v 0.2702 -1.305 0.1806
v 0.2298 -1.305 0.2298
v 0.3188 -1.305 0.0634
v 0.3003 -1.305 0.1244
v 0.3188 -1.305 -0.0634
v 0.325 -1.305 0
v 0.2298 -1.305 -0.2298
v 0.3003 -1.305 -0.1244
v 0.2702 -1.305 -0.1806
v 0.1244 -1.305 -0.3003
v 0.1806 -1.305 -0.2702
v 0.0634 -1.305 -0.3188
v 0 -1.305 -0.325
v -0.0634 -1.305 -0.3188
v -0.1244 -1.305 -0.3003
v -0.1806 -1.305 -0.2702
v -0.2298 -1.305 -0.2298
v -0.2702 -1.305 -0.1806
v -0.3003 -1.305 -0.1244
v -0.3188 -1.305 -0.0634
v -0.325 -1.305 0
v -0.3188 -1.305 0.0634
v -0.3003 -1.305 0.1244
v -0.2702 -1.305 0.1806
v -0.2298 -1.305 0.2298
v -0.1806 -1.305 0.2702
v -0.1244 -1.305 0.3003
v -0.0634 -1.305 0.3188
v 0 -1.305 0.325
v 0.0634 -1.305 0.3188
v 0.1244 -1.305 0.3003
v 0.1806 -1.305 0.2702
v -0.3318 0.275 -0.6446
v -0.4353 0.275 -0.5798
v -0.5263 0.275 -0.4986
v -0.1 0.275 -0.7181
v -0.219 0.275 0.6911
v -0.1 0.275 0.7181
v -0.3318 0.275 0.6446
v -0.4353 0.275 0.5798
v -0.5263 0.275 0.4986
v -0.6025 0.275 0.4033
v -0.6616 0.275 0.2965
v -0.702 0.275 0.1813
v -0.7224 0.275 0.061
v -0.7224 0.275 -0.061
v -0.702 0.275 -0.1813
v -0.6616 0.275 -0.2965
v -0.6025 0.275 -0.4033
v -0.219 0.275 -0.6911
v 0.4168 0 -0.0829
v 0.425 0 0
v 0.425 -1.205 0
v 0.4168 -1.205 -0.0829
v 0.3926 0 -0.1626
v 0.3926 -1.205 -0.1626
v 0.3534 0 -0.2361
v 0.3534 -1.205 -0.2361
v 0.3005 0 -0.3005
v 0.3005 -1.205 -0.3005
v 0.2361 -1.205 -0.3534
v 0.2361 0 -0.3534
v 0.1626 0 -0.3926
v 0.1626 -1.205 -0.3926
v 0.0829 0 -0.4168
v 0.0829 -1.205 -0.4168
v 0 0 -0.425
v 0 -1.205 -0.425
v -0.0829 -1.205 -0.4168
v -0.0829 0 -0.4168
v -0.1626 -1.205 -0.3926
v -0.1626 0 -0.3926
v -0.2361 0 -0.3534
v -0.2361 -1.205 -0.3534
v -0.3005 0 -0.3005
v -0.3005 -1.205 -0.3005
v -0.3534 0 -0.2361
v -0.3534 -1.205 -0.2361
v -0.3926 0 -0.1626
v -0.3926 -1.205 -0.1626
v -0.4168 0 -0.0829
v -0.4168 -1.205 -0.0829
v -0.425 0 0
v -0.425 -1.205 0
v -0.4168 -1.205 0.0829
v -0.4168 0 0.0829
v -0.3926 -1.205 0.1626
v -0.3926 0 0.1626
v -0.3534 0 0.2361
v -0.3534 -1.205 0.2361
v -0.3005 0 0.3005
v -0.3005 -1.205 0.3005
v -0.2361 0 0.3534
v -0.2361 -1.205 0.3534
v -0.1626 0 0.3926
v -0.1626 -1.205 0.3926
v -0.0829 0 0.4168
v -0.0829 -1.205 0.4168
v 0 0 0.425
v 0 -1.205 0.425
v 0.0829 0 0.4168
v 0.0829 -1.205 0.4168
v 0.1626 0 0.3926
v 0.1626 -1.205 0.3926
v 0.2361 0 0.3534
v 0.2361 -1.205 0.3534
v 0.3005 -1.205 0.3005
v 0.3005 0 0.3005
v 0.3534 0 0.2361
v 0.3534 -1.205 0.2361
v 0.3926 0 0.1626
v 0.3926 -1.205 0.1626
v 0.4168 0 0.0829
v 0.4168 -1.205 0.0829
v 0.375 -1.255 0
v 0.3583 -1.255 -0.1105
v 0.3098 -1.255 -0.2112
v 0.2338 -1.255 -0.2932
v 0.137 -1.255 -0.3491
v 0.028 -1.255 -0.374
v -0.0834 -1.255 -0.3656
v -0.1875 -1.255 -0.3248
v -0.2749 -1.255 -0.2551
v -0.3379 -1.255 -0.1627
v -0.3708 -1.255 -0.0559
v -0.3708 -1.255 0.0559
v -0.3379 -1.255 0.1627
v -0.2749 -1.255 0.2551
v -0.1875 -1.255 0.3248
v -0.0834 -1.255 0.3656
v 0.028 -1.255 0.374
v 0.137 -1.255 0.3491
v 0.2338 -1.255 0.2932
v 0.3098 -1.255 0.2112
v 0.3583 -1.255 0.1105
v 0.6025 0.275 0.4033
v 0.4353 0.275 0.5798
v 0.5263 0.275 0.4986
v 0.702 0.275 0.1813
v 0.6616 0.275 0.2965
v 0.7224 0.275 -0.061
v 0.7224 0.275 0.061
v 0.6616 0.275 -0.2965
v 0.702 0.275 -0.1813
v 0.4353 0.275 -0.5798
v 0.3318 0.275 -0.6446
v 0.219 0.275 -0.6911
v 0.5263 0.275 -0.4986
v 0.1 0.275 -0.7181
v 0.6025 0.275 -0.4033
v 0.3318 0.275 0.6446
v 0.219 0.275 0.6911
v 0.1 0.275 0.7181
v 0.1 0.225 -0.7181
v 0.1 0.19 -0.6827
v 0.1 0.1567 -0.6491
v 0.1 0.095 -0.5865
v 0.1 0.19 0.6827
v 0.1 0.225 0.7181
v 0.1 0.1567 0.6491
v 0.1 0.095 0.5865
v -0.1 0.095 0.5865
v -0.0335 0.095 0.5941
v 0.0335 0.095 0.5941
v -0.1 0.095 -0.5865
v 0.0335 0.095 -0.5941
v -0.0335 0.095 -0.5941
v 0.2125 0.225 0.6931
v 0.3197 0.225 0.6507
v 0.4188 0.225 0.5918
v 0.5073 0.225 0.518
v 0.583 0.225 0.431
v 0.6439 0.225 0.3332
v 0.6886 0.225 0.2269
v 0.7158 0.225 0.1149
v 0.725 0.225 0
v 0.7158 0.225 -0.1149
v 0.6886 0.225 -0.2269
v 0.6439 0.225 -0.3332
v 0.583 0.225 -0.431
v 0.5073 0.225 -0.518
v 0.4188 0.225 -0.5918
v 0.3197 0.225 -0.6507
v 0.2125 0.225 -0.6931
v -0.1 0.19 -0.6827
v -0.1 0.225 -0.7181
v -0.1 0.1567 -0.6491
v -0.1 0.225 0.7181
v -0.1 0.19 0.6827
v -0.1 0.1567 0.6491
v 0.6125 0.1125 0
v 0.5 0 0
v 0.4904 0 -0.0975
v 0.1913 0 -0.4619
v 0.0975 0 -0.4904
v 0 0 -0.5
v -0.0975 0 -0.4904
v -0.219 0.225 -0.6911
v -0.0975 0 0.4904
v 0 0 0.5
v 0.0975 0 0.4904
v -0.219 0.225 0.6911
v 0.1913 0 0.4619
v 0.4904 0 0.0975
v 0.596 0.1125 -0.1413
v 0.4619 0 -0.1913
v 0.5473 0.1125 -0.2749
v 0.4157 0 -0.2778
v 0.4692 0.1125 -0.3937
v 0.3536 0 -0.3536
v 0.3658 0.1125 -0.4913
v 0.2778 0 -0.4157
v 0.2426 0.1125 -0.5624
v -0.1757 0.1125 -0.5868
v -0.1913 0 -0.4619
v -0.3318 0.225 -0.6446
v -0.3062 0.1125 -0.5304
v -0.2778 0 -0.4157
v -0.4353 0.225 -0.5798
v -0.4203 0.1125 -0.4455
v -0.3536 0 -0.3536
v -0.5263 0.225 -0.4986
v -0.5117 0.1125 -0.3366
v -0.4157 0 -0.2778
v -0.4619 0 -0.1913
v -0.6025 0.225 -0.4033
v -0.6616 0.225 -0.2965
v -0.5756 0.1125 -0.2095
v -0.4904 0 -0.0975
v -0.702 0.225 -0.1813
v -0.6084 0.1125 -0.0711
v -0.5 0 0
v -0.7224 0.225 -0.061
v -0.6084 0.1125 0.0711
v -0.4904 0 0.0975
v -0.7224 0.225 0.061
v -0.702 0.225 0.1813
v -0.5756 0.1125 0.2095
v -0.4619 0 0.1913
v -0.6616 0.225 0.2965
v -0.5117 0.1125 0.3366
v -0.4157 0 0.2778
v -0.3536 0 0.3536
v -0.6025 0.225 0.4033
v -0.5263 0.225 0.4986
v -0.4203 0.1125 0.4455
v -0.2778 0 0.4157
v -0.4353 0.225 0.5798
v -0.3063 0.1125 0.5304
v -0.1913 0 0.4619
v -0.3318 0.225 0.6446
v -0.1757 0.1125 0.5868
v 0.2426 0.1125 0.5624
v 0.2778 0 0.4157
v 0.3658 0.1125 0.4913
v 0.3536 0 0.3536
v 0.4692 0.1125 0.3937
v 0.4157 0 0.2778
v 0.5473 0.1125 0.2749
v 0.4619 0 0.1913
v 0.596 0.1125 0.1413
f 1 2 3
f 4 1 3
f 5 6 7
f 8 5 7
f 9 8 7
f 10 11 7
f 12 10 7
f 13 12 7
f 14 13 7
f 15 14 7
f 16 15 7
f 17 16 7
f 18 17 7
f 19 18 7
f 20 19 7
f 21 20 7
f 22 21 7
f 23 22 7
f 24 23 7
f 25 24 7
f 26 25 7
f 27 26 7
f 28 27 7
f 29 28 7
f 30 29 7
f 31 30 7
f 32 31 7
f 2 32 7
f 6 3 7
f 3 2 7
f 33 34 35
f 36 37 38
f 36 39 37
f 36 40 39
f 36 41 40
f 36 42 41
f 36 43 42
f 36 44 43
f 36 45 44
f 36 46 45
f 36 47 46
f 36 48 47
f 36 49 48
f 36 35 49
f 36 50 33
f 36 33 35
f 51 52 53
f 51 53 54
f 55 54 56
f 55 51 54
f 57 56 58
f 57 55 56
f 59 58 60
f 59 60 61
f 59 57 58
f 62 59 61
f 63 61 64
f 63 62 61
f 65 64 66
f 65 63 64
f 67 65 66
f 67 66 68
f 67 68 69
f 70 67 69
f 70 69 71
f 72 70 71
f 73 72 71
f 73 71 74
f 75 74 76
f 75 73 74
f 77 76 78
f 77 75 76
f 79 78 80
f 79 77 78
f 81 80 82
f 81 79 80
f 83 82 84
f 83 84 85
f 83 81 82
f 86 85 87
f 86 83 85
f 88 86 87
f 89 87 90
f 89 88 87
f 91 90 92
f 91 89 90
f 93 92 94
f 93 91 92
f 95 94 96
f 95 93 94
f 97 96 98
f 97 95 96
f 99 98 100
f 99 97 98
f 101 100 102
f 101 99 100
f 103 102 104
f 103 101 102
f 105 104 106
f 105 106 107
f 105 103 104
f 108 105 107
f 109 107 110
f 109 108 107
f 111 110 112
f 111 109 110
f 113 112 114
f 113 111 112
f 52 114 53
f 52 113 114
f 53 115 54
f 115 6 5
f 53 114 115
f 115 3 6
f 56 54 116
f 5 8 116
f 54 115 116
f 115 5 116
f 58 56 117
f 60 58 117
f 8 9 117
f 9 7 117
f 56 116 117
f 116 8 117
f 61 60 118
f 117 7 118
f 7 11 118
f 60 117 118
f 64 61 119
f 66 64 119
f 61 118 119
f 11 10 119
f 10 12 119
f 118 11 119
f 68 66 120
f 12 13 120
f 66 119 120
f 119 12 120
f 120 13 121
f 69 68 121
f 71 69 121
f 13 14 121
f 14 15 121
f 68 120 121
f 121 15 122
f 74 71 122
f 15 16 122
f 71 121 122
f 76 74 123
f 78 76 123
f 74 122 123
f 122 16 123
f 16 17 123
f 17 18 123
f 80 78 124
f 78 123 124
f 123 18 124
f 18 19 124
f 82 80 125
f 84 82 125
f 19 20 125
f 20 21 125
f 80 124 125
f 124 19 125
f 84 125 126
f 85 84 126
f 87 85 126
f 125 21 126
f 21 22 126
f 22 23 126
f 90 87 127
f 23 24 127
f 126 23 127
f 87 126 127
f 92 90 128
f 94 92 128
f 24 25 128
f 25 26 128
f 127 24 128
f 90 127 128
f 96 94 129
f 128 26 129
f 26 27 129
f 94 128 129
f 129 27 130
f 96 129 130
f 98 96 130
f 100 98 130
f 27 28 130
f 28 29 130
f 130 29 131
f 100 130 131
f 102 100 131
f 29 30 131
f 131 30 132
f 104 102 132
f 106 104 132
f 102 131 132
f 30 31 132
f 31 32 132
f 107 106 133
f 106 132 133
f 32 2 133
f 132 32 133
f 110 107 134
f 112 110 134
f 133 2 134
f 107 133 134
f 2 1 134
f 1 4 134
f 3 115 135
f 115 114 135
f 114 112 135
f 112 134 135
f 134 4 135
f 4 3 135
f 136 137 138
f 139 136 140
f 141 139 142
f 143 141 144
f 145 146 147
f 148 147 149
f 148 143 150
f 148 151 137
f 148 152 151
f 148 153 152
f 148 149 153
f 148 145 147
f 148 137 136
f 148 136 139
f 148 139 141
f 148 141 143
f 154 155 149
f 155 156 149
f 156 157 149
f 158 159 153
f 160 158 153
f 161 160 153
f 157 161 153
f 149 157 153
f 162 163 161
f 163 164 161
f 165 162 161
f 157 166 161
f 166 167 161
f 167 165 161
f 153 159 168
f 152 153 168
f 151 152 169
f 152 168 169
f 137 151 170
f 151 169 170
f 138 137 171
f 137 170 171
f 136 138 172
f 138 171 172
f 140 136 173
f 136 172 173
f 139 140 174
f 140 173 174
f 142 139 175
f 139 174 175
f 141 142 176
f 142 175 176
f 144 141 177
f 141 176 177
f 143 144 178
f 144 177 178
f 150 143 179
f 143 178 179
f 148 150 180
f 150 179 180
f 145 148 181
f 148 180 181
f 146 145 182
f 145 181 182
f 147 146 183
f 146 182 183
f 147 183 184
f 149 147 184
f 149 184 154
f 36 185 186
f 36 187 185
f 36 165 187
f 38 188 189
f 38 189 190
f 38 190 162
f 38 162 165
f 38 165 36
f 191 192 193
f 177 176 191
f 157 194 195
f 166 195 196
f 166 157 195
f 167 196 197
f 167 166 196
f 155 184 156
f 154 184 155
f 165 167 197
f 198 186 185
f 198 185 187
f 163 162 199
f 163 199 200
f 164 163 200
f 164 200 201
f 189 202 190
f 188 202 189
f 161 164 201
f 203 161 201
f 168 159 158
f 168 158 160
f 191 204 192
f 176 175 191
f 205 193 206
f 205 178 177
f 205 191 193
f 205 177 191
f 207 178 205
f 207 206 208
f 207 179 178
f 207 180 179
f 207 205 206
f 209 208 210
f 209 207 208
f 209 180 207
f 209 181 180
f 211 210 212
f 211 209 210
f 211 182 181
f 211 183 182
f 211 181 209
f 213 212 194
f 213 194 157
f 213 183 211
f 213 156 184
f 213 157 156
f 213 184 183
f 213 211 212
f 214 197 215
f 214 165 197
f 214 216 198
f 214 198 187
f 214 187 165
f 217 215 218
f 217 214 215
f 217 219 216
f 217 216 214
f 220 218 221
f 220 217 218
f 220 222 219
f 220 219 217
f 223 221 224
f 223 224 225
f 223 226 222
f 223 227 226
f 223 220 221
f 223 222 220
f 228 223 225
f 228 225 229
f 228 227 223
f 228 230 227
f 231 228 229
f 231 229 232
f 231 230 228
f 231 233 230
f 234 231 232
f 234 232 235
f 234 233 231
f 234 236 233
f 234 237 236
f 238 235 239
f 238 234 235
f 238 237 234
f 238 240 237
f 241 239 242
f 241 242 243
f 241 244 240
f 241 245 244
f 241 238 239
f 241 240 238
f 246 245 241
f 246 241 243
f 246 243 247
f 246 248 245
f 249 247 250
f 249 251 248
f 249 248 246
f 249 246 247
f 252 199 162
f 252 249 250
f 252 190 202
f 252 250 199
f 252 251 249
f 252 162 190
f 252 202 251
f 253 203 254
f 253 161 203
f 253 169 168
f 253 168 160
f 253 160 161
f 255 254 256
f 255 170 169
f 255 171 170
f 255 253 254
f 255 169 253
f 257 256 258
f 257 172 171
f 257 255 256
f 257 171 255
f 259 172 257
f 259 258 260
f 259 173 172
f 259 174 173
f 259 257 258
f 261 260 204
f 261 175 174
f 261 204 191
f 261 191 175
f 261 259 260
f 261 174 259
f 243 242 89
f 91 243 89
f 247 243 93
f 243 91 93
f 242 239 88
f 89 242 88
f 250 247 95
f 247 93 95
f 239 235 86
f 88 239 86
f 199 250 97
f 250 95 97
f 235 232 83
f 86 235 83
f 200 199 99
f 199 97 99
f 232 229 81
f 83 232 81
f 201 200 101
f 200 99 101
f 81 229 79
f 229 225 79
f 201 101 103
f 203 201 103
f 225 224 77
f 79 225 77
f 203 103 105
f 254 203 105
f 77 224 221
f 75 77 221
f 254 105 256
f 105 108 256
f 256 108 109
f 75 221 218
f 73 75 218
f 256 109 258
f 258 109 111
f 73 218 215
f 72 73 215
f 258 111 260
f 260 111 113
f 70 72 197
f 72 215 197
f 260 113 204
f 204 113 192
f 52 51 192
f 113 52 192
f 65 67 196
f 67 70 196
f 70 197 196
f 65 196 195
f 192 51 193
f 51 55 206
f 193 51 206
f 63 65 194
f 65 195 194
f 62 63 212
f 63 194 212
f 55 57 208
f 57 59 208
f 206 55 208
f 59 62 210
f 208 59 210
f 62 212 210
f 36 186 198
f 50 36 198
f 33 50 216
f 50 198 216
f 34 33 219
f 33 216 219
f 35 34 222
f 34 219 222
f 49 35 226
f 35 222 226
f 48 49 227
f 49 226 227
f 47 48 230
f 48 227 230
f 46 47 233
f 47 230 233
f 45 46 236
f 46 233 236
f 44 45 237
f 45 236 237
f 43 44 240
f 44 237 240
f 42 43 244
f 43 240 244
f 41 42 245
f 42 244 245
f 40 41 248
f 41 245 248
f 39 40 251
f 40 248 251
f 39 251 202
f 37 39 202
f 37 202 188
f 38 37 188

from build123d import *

# Parameters (mm, degrees)
SKETCH1_R               = 0.725
BOSS_EXTRUDE1_DEPTH     = 0.275
SKETCH2_R               = 0.425
BOSS_EXTRUDE2_DEPTH     = 1.305
CHAMFER1_SIZE           = 0.1
CHAMFER2_SIZE           = 0.225
SKETCH3_W               = 0.2
SKETCH3_H               = 0.546644051
CUT_EXTRUDE1_DEPTH      = 1.725
CUT_EXTRUDE1_DEPTH_BACK = 1.725


with BuildPart() as part:
    # Sketch1 → Boss-Extrude1 (new body)
    with BuildSketch(Plane(origin=(0, 0, 0), x_dir=(1, 0, 0), z_dir=(0, 1, 0))):
        Circle(SKETCH1_R)
    extrude(amount=BOSS_EXTRUDE1_DEPTH)

    # Sketch2 → Boss-Extrude2 (add)
    with BuildSketch(Plane(origin=(0, 0, 0), x_dir=(1, 0, 0), z_dir=(0, 1, 0))):
        Circle(SKETCH2_R)
    extrude(amount=-BOSS_EXTRUDE2_DEPTH)

    # Chamfer1
    chamfer1_edges = [part.edges().sort_by_distance(p)[0] for p in [
        (-0.425, -1.305, 0),
    ]]
    chamfer(chamfer1_edges, length=CHAMFER1_SIZE)

    # Chamfer2
    chamfer2_edges = [part.edges().sort_by_distance(p)[0] for p in [
        (-0.725, 0, 0),
    ]]
    chamfer(chamfer2_edges, length=CHAMFER2_SIZE)

    # Sketch3 → Cut-Extrude1 (cut, two sides)
    with BuildSketch(Plane.XY) as cut_extrude1_sk:
        with Locations((0, 0.368322025)):
            Rectangle(SKETCH3_W, SKETCH3_H)
    extrude(amount=CUT_EXTRUDE1_DEPTH, mode=Mode.SUBTRACT)
    extrude(cut_extrude1_sk.sketch, amount=-CUT_EXTRUDE1_DEPTH_BACK, mode=Mode.SUBTRACT)


solid = part.part
